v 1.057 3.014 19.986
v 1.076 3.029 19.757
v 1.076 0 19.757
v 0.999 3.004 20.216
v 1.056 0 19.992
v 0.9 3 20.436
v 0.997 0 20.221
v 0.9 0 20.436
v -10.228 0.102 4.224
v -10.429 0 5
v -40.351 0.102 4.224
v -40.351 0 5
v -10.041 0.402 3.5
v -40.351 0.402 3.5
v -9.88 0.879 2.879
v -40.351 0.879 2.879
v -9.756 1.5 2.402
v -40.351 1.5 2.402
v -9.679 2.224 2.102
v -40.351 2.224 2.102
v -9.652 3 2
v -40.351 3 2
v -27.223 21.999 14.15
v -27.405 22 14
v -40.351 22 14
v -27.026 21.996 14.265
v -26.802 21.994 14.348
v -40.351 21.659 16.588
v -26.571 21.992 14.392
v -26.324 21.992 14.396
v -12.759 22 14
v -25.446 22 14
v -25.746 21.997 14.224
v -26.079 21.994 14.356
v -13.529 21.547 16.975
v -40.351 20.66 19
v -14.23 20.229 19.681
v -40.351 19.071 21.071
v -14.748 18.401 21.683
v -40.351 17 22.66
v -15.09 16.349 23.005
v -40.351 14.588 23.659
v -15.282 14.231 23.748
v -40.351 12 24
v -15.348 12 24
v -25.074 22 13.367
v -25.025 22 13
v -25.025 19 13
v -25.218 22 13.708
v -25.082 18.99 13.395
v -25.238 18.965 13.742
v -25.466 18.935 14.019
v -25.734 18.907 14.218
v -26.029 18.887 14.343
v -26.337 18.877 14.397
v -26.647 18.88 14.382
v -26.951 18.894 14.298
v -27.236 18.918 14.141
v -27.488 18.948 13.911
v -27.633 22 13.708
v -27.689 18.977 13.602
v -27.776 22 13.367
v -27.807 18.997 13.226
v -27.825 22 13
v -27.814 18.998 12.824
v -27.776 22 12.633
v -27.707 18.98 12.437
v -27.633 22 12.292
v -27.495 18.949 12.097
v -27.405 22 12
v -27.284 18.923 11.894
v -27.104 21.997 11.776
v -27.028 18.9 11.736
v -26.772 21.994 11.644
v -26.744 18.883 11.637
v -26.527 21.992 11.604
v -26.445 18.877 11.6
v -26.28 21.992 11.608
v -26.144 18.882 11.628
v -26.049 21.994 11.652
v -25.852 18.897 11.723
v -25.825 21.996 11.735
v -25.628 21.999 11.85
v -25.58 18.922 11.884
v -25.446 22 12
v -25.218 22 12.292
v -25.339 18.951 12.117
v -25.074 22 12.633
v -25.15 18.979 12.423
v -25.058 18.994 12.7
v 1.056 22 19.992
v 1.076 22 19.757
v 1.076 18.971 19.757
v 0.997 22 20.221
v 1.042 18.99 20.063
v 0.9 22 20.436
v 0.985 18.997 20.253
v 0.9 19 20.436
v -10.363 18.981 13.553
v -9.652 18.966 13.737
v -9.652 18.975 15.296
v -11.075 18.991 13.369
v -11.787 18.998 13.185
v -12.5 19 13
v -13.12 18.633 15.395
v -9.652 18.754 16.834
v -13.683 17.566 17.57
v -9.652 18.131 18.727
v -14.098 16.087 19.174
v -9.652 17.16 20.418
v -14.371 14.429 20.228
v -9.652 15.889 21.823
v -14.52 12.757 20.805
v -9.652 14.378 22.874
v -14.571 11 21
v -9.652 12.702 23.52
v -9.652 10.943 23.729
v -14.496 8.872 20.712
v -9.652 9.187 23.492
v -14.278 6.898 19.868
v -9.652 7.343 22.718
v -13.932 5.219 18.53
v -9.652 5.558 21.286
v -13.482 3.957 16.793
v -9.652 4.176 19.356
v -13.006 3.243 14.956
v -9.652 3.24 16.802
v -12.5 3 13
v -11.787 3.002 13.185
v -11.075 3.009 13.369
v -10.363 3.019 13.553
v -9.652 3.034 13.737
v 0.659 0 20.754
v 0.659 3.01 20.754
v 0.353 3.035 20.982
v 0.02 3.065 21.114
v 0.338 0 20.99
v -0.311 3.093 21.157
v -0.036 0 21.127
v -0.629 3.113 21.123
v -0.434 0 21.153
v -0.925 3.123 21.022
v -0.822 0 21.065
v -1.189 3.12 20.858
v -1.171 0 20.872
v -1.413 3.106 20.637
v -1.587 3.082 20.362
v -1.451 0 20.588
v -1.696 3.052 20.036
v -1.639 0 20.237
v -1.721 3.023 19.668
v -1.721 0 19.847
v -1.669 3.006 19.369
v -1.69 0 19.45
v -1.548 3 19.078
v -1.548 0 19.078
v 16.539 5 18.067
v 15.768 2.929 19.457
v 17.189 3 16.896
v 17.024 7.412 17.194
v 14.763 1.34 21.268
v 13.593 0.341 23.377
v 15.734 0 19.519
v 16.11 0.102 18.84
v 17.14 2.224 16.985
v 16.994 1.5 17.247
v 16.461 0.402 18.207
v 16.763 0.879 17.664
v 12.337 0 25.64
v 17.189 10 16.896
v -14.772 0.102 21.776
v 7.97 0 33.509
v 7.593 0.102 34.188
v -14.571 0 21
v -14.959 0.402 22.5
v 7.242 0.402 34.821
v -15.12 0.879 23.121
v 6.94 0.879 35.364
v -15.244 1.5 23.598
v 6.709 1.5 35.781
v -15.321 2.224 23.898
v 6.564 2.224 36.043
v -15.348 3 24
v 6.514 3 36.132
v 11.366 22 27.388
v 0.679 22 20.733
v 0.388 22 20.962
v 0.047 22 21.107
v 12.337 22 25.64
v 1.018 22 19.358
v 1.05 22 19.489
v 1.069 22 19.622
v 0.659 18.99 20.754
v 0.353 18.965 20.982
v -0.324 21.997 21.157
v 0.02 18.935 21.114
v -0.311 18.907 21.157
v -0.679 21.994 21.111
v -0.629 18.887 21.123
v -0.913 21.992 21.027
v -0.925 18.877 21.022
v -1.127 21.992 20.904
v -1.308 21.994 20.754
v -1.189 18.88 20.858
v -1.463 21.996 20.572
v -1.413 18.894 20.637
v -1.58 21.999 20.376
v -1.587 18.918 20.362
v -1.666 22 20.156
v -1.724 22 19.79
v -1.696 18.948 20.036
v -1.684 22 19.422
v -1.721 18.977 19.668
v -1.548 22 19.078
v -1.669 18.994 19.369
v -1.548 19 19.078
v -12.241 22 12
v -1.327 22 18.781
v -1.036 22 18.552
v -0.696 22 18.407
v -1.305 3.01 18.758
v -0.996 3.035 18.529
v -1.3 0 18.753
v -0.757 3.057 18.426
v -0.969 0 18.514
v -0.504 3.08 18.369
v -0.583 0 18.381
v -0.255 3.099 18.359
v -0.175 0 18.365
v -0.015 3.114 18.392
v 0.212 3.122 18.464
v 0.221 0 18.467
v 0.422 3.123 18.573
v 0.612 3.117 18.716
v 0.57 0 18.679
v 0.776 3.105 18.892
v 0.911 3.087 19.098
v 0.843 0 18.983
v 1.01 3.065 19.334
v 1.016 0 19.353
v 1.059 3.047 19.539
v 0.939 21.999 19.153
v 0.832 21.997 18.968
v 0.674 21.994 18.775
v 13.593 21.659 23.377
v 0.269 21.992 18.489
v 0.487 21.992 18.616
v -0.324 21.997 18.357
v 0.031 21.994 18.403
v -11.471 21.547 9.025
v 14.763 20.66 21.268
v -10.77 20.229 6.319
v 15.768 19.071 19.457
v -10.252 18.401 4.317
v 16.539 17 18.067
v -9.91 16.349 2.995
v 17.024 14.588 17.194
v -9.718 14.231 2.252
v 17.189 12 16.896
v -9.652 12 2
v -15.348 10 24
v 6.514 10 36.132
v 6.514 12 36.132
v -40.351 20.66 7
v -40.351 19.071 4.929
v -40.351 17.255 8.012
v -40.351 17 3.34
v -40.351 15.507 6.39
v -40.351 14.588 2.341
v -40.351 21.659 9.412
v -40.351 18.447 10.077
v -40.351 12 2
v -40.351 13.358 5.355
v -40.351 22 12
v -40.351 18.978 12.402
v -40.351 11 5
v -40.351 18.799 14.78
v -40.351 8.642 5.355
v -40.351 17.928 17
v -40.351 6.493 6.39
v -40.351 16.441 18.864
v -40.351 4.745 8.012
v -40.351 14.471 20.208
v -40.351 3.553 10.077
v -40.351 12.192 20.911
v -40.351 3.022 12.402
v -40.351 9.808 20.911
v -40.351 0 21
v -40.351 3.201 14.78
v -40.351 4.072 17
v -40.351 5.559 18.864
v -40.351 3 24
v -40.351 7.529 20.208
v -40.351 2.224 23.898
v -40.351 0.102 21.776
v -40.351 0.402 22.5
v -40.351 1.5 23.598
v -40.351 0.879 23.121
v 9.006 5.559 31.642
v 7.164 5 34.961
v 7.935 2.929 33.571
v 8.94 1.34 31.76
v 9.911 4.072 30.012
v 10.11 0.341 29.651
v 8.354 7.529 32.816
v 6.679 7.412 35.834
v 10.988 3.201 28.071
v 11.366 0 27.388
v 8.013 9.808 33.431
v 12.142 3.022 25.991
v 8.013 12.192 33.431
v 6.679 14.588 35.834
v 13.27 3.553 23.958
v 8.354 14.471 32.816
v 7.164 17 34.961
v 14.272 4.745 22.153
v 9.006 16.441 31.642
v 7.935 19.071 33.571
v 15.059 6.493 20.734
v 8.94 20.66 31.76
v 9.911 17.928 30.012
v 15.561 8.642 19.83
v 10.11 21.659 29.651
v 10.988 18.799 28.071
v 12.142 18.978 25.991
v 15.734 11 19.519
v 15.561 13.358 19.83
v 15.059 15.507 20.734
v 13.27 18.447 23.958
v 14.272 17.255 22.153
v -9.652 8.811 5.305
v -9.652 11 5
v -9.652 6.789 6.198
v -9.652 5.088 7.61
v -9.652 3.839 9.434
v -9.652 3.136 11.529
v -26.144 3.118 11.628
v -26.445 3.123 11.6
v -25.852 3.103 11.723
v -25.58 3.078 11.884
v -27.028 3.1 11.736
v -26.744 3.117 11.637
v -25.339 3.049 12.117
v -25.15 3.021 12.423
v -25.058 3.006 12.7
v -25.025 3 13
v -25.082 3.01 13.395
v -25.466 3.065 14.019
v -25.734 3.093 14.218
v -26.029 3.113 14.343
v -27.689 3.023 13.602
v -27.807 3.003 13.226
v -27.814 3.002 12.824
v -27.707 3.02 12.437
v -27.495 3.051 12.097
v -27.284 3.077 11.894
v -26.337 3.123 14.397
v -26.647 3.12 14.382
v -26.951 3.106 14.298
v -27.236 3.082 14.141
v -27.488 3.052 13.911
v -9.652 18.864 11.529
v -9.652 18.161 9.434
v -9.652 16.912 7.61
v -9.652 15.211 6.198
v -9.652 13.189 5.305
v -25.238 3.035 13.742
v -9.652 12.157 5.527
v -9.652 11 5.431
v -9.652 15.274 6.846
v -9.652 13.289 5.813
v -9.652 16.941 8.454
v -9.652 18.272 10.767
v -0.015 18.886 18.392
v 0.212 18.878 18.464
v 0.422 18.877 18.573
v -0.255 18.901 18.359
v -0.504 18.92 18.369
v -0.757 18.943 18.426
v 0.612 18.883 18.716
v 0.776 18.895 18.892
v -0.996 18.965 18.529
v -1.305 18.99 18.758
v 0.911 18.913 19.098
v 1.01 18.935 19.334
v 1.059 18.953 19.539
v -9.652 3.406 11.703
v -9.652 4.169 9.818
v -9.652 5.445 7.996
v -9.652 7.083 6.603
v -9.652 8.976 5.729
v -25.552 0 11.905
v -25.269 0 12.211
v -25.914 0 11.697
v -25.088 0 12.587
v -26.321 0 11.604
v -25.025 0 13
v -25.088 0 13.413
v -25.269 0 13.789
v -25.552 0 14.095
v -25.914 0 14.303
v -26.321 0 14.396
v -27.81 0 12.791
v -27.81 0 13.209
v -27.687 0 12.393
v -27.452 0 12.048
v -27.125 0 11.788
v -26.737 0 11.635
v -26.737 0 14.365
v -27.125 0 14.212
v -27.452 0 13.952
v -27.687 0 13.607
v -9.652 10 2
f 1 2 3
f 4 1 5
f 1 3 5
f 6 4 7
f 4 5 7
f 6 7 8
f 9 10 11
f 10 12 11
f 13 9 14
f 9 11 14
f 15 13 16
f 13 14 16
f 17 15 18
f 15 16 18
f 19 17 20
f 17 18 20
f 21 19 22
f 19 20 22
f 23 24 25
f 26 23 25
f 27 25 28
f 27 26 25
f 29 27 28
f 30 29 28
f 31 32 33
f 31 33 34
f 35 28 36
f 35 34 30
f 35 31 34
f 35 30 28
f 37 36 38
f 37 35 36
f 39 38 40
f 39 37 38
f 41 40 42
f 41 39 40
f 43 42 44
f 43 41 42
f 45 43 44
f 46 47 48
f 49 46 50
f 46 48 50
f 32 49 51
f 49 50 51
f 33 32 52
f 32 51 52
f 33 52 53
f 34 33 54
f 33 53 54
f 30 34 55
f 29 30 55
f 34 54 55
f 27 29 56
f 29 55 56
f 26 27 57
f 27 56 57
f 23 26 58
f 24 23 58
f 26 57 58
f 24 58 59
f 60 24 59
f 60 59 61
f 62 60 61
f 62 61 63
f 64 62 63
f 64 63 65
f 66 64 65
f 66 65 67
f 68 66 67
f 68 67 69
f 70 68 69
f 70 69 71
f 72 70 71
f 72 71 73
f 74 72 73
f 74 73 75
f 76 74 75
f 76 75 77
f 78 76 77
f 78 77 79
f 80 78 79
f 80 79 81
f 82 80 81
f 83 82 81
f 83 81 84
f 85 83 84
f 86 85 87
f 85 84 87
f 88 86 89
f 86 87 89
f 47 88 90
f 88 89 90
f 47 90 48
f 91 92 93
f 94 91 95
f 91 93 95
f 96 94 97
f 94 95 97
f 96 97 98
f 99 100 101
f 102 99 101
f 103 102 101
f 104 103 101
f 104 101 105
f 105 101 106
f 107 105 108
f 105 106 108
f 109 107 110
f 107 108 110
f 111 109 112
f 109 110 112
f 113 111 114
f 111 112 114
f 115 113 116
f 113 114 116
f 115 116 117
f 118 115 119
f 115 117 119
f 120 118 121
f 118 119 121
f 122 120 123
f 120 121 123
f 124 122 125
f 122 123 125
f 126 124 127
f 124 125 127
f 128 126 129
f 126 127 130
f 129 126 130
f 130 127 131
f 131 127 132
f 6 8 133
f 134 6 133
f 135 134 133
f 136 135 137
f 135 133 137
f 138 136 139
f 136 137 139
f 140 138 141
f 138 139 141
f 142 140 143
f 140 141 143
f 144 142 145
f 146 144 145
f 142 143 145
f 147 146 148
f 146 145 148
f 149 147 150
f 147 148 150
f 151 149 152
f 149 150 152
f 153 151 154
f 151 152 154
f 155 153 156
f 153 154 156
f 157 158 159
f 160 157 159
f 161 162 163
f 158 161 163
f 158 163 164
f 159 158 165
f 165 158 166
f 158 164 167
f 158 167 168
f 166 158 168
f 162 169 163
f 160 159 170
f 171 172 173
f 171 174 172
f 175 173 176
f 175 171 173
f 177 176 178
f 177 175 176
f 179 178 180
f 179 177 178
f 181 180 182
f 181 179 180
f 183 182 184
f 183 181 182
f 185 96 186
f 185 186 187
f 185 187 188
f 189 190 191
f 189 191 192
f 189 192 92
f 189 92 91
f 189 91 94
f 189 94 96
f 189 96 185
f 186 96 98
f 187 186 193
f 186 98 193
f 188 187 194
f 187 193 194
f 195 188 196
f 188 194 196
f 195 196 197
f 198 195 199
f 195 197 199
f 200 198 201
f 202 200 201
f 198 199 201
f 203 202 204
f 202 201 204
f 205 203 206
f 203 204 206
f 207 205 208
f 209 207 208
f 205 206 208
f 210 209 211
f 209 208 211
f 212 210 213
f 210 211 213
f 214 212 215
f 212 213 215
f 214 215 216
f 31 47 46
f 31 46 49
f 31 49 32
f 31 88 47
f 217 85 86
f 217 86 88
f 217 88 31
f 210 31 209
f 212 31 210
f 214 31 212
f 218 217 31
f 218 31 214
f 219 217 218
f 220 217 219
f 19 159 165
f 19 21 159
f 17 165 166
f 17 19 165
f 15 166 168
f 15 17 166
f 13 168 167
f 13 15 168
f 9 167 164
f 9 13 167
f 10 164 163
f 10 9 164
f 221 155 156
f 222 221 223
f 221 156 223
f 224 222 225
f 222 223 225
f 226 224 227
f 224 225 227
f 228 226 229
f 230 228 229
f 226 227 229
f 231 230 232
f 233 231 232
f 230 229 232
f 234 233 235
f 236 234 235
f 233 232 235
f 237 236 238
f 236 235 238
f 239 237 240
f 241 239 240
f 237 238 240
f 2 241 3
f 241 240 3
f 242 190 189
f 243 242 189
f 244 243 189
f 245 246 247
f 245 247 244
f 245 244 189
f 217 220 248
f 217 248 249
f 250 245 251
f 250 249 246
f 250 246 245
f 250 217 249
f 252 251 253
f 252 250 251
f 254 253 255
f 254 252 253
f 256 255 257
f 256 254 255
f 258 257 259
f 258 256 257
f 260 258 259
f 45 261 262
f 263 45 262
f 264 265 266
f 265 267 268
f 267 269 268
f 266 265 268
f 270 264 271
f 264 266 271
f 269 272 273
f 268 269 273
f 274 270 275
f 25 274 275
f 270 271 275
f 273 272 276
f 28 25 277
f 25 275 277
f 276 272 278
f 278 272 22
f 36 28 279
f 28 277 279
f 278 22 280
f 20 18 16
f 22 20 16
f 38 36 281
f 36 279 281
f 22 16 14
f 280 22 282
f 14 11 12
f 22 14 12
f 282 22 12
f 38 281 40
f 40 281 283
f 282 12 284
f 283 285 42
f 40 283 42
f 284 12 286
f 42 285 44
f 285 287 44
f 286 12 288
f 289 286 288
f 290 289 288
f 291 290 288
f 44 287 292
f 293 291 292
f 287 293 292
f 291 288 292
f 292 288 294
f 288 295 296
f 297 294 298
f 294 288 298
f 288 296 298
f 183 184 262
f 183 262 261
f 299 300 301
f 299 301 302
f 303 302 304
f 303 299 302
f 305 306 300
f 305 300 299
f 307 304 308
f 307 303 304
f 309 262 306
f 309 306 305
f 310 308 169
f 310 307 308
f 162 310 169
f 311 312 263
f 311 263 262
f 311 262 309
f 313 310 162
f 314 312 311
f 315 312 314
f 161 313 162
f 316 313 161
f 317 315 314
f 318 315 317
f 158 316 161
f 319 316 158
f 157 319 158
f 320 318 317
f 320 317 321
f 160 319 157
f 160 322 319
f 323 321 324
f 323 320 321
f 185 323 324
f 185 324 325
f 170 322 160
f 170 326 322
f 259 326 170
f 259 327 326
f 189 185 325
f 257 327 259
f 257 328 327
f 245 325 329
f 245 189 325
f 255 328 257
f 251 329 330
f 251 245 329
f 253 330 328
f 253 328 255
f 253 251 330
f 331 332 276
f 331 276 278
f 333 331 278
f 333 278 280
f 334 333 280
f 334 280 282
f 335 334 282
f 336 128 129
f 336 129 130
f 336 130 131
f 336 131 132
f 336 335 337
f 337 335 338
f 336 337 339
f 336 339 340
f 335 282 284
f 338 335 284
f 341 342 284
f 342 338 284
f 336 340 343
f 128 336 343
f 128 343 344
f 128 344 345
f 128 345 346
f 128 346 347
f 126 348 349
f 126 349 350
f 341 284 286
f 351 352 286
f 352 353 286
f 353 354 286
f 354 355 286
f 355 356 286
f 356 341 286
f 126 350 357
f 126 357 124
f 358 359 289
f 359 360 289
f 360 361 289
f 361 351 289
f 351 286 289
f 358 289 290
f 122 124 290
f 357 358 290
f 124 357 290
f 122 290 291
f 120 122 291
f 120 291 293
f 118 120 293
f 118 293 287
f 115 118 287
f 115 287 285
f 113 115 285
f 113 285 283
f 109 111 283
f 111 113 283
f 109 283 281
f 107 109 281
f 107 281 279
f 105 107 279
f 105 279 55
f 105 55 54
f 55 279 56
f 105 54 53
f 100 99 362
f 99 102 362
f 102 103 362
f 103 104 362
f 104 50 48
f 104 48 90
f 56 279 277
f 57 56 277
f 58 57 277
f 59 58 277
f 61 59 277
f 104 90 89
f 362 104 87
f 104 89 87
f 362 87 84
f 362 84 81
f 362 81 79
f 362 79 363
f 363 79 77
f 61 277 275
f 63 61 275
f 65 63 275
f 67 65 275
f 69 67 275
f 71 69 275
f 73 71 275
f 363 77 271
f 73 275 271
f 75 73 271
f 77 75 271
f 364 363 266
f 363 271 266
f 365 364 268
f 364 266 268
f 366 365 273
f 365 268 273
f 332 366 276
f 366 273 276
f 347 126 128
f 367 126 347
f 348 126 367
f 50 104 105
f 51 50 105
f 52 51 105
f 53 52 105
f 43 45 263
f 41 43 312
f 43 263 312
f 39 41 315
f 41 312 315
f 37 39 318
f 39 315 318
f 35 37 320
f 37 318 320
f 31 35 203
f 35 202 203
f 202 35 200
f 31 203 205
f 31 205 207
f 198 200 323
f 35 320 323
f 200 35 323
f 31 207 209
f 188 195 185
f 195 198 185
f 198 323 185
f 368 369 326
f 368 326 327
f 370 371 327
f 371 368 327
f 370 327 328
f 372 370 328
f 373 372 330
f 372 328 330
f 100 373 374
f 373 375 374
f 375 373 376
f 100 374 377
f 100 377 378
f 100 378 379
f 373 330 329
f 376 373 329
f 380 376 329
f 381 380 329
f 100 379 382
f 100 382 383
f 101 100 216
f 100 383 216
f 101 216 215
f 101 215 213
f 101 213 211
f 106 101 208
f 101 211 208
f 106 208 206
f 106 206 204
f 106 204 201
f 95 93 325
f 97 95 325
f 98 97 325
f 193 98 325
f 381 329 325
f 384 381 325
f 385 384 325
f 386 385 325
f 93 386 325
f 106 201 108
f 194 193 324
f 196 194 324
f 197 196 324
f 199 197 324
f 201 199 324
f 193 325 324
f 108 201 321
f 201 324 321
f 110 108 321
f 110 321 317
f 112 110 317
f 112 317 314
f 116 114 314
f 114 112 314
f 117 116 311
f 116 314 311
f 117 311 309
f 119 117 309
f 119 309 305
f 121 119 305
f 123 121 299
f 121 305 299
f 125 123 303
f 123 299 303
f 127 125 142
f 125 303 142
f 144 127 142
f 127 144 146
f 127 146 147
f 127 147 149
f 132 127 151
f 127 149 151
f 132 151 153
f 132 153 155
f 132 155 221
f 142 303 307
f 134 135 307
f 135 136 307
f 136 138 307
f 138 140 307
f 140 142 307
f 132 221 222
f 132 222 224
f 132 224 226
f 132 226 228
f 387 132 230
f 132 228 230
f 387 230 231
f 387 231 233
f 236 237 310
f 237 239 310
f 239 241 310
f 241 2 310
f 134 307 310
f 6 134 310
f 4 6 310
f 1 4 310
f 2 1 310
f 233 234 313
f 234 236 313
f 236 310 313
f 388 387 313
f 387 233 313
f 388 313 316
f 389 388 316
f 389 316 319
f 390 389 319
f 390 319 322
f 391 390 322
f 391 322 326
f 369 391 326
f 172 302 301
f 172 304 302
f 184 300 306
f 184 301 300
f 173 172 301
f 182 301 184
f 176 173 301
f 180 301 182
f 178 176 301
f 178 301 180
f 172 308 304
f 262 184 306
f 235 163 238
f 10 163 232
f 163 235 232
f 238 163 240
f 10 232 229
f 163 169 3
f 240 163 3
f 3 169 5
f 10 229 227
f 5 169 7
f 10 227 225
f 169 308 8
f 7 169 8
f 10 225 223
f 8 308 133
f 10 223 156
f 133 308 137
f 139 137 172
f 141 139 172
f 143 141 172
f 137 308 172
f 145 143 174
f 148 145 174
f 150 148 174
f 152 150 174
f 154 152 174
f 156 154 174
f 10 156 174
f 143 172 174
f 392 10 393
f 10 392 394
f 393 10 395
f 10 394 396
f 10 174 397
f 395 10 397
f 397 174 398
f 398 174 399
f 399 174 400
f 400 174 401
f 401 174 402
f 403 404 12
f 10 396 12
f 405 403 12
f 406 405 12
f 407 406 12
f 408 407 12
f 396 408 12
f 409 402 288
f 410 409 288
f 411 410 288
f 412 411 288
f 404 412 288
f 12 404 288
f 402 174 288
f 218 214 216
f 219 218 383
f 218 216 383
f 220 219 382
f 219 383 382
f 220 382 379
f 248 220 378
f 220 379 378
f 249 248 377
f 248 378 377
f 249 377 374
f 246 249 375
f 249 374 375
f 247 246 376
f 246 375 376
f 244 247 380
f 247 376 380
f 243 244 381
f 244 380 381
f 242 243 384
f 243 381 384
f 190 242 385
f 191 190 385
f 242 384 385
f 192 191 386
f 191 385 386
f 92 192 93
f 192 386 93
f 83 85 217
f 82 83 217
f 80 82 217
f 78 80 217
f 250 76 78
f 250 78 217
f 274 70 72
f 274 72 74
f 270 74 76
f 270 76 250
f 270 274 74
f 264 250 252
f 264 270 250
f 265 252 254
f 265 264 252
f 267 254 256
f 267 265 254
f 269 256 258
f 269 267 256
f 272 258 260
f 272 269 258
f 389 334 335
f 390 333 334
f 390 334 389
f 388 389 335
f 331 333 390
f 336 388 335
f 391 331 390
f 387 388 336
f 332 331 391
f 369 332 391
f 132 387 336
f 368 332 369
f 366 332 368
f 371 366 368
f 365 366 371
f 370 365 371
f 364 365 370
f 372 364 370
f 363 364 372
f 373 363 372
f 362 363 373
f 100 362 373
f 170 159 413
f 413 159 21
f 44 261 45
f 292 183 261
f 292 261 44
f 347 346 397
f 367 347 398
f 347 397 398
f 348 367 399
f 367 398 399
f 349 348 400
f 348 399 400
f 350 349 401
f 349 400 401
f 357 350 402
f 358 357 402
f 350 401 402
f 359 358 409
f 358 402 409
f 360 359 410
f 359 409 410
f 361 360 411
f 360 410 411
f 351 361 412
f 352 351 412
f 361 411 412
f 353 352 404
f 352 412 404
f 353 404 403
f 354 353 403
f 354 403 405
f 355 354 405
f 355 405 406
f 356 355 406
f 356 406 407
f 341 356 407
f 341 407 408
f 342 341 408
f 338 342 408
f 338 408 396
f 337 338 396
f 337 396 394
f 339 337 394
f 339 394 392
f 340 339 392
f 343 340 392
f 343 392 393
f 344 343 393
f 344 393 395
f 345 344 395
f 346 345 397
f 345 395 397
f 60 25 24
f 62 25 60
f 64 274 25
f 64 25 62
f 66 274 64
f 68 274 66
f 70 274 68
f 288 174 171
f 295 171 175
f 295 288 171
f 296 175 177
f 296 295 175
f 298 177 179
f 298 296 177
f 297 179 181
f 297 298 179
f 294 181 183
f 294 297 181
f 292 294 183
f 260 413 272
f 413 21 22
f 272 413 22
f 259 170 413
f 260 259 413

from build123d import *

# Parameters (mm, degrees)
BOSS_EXTRUDE3_DEPTH = 22
CUT_EXTRUDE4_DEPTH  = 59.108375
CUT_EXTRUDE5_REACH  = 125.396
SKETCH5_R           = 8
CUT_EXTRUDE6_REACH  = 125.396
SKETCH7_R           = 8
FILLET1_R           = 10
CUT_EXTRUDE9_DEPTH  = 28.41
CUT_EXTRUDE10_DEPTH = 33.85
BOSS_EXTRUDE4_REACH = 60.461
BOSS_EXTRUDE5_REACH = 60.461
BOSS_EXTRUDE6_REACH = 60.461
BOSS_EXTRUDE7_REACH = 60.461
CUT_EXTRUDE11_DEPTH = 40
FILLET2_R           = 3


with BuildPart() as part:
    # Sketch1 → Boss-Extrude3 (new body)
    with BuildSketch(Plane(origin=(0, 0, 0), x_dir=(1, 0, 0), z_dir=(0, 1, 0))):
        Polygon((36.111730264, -52.557630883), (46.787036785, -33.321263484), (-9.652310469, -2), (-68.760685704, -2), (-68.760685704, -24), (-15.347689531, -24), align=None)
    extrude(amount=BOSS_EXTRUDE3_DEPTH)

    # Sketch4 → Cut-Extrude4 (cut)
    with BuildSketch(Plane.ZY.offset(68.760685704)):
        with BuildLine():
            ThreePointArc((21, 11), (13, 19), (5, 11))
            Line((5, 11), (21, 11))
        make_face()
        with BuildLine():
            Line((21, 11), (5, 11))
            ThreePointArc((5, 11), (13, 3), (21, 11))
        make_face()
    extrude(amount=-CUT_EXTRUDE4_DEPTH, mode=Mode.SUBTRACT)

    # Cut-Extrude5: up to this plane
    cut_extrude5_end = Plane(origin=(-9.652310469, 0, 0), z_dir=(-1, 0, 0))
    # Sketch5 → Cut-Extrude5 (cut, up to the surface)
    with BuildSketch(Plane(origin=(49.908331158, 0, 27.696847436), x_dir=(0.4852412054872001, 0, -0.87438033629384), z_dir=(0.87438033629384, 0, 0.4852412054872001)), mode=Mode.PRIVATE) as cut_extrude5_sk1:
        with Locations((-17.43245944, 11)):
            Circle(SKETCH5_R)
    cut_extrude5_tool1 = split(extrude(cut_extrude5_sk1.sketch, amount=-CUT_EXTRUDE5_REACH, mode=Mode.PRIVATE), bisect_by=cut_extrude5_end, keep=Keep.BOTH, mode=Mode.PRIVATE)
    add(cut_extrude5_tool1.solids().sort_by_distance((41.449384, 11, 42.939447))[0], mode=Mode.SUBTRACT)

    # Sketch7 → Cut-Extrude6 (cut, up to next)
    with BuildSketch(Plane(origin=(49.908331158, 0, 27.696847436), x_dir=(0.4852412054872001, 0, -0.87438033629384), z_dir=(0.87438033629384, 0, 0.4852412054872001)), mode=Mode.PRIVATE) as cut_extrude6_sk1:
        with Locations((-17.43245944, 11)):
            Circle(SKETCH7_R)
    cut_extrude6_tool1 = extrude(cut_extrude6_sk1.sketch, amount=-CUT_EXTRUDE6_REACH, mode=Mode.PRIVATE) & part.part
    add(cut_extrude6_tool1.solids().sort_by_distance((41.449384, 11, 42.939447))[0], mode=Mode.SUBTRACT)

    # Fillet1
    fillet1_edges = [part.edges().sort_by_distance(p)[0] for p in [
        (18.567363158, 0, 17.660631742),
        (10.382020367, 0, 38.278815441),
        (18.567363158, 22, 17.660631742),
        (-39.206498086, 22, 2),
        (-42.054187617, 22, 24),
        (10.382020367, 22, 38.278815441),
        (-42.054187617, 0, 24),
        (-39.206498086, 0, 2),
    ]]
    fillet(fillet1_edges, radius=FILLET1_R)

    # Sketch9 → Cut-Extrude9 (cut)
    with BuildSketch(Plane.ZY.offset(68.760685704)):
        with BuildLine():
            Line((2, 12), (2, 10))
            ThreePointArc((2, 10), (4.928932188, 2.928932188), (12, 0))
            Line((12, 0), (14, 0))
            ThreePointArc((14, 0), (21.071067812, 2.928932188), (24, 10))
            Line((24, 10), (24, 12))
            ThreePointArc((24, 12), (21.071067812, 19.071067812), (14, 22))
            Line((14, 22), (12, 22))
            ThreePointArc((12, 22), (4.928932188, 19.071067812), (2, 12))
        make_face()
    extrude(amount=-CUT_EXTRUDE9_DEPTH, mode=Mode.SUBTRACT)

    # Sketch10 → Cut-Extrude10 (cut)
    with BuildSketch(Plane(origin=(49.908331158, 0, 27.696847436), x_dir=(0.4852412054872001, 0, -0.87438033629384), z_dir=(0.87438033629384, 0, 0.4852412054872001))):
        with BuildLine():
            Line((-18.43245944, 0), (-16.43245944, 0))
            ThreePointArc((-16.43245944, 0), (-9.361391629, 2.928932188), (-6.43245944, 10))
            Line((-6.43245944, 10), (-6.43245944, 12))
            ThreePointArc((-6.43245944, 12), (-9.361391629, 19.071067812), (-16.43245944, 22))
            Line((-16.43245944, 22), (-18.43245944, 22))
            ThreePointArc((-18.43245944, 22), (-25.503527252, 19.071067812), (-28.43245944, 12))
            Line((-28.43245944, 12), (-28.43245944, 10))
            ThreePointArc((-28.43245944, 10), (-25.503527252, 2.928932188), (-18.43245944, 0))
        make_face()
    extrude(amount=-CUT_EXTRUDE10_DEPTH, mode=Mode.SUBTRACT)

    # Sketch11 → Boss-Extrude4 (add, up to next)
    with BuildSketch(Plane.XZ, mode=Mode.PRIVATE) as boss_extrude4_sk1:
        Polygon((-15.347689531, 24), (-40.350685704, 24), (-40.350685704, 14), (-12.758880866, 14), align=None)
    boss_extrude4_tool1 = extrude(boss_extrude4_sk1.sketch, amount=-BOSS_EXTRUDE4_REACH, mode=Mode.PRIVATE) - part.part
    add(boss_extrude4_tool1.solids().sort_by_distance((-27.191367, 0, 18.917964))[0])

    # Sketch12 → Boss-Extrude5 (add, up to next)
    with BuildSketch(Plane.XZ, mode=Mode.PRIVATE) as boss_extrude5_sk1:
        Polygon((6.513955881, 36.132216077), (-15.347689531, 24), (-12.758880866, 14), (11.366367936, 27.388412714), align=None)
    boss_extrude5_tool1 = extrude(boss_extrude5_sk1.sketch, amount=-BOSS_EXTRUDE5_REACH, mode=Mode.PRIVATE) - part.part
    add(boss_extrude5_tool1.solids().sort_by_distance((-2.526039, 0, 25.303272))[0])

    # Sketch13 → Boss-Extrude6 (add, up to next)
    with BuildSketch(Plane.XZ, mode=Mode.PRIVATE) as boss_extrude6_sk1:
        Polygon((-40.350685704, 12), (-12.241119134, 12), (-9.652310469, 2), (-40.350685704, 2), align=None)
    boss_extrude6_tool1 = extrude(boss_extrude6_sk1.sketch, amount=-BOSS_EXTRUDE6_REACH, mode=Mode.PRIVATE) - part.part
    add(boss_extrude6_tool1.solids().sort_by_distance((-25.639203, 0, 6.926631))[0])

    # Sketch14 → Boss-Extrude7 (add, up to next)
    with BuildSketch(Plane.XZ, mode=Mode.PRIVATE) as boss_extrude7_sk1:
        Polygon((-12.241119134, 12), (12.336850347, 25.639652042), (17.189262401, 16.895848679), (-9.652310469, 2), align=None)
    boss_extrude7_tool1 = extrude(boss_extrude7_sk1.sketch, amount=-BOSS_EXTRUDE7_REACH, mode=Mode.PRIVATE) - part.part
    add(boss_extrude7_tool1.solids().sort_by_distance((1.935469, 0, 14.065113))[0])

    # Sketch15 → Cut-Extrude11 (cut)
    with BuildSketch(Plane.XZ):
        with BuildLine():
            ThreePointArc((-27.825342852, 13), (-26.425342852, 11.6), (-25.025342852, 13))
            Line((-25.025342852, 13), (-27.825342852, 13))
        make_face()
        with BuildLine():
            Line((-27.825342852, 13), (-25.025342852, 13))
            ThreePointArc((-25.025342852, 13), (-26.425342852, 14.4), (-27.825342852, 13))
        make_face()
        with BuildLine():
            ThreePointArc((0.899937041, 20.436353877), (-1.003533117, 20.98114866), (-1.5483279, 19.077678501))
            Line((-1.5483279, 19.077678501), (0.899937041, 20.436353877))
        make_face()
        with BuildLine():
            Line((0.899937041, 20.436353877), (-1.5483279, 19.077678501))
            ThreePointArc((-1.5483279, 19.077678501), (0.026671027, 18.401696031), (1.075804571, 19.757016189))
            ThreePointArc((1.075804571, 19.757016189), (1.031124728, 20.107882646), (0.899937041, 20.436353877))
        make_face()
    extrude(amount=-CUT_EXTRUDE11_DEPTH, mode=Mode.SUBTRACT)

    # Fillet2
    fillet2_edges = [part.edges().sort_by_distance(p)[0] for p in [
        (-27.849187617, 0, 24),
        (-4.416866825, 0, 30.066108039),
        (-25.001498086, 0, 2),
        (3.768475966, 0, 9.447924339),
    ]]
    fillet(fillet2_edges, radius=FILLET2_R)


solid = part.part
